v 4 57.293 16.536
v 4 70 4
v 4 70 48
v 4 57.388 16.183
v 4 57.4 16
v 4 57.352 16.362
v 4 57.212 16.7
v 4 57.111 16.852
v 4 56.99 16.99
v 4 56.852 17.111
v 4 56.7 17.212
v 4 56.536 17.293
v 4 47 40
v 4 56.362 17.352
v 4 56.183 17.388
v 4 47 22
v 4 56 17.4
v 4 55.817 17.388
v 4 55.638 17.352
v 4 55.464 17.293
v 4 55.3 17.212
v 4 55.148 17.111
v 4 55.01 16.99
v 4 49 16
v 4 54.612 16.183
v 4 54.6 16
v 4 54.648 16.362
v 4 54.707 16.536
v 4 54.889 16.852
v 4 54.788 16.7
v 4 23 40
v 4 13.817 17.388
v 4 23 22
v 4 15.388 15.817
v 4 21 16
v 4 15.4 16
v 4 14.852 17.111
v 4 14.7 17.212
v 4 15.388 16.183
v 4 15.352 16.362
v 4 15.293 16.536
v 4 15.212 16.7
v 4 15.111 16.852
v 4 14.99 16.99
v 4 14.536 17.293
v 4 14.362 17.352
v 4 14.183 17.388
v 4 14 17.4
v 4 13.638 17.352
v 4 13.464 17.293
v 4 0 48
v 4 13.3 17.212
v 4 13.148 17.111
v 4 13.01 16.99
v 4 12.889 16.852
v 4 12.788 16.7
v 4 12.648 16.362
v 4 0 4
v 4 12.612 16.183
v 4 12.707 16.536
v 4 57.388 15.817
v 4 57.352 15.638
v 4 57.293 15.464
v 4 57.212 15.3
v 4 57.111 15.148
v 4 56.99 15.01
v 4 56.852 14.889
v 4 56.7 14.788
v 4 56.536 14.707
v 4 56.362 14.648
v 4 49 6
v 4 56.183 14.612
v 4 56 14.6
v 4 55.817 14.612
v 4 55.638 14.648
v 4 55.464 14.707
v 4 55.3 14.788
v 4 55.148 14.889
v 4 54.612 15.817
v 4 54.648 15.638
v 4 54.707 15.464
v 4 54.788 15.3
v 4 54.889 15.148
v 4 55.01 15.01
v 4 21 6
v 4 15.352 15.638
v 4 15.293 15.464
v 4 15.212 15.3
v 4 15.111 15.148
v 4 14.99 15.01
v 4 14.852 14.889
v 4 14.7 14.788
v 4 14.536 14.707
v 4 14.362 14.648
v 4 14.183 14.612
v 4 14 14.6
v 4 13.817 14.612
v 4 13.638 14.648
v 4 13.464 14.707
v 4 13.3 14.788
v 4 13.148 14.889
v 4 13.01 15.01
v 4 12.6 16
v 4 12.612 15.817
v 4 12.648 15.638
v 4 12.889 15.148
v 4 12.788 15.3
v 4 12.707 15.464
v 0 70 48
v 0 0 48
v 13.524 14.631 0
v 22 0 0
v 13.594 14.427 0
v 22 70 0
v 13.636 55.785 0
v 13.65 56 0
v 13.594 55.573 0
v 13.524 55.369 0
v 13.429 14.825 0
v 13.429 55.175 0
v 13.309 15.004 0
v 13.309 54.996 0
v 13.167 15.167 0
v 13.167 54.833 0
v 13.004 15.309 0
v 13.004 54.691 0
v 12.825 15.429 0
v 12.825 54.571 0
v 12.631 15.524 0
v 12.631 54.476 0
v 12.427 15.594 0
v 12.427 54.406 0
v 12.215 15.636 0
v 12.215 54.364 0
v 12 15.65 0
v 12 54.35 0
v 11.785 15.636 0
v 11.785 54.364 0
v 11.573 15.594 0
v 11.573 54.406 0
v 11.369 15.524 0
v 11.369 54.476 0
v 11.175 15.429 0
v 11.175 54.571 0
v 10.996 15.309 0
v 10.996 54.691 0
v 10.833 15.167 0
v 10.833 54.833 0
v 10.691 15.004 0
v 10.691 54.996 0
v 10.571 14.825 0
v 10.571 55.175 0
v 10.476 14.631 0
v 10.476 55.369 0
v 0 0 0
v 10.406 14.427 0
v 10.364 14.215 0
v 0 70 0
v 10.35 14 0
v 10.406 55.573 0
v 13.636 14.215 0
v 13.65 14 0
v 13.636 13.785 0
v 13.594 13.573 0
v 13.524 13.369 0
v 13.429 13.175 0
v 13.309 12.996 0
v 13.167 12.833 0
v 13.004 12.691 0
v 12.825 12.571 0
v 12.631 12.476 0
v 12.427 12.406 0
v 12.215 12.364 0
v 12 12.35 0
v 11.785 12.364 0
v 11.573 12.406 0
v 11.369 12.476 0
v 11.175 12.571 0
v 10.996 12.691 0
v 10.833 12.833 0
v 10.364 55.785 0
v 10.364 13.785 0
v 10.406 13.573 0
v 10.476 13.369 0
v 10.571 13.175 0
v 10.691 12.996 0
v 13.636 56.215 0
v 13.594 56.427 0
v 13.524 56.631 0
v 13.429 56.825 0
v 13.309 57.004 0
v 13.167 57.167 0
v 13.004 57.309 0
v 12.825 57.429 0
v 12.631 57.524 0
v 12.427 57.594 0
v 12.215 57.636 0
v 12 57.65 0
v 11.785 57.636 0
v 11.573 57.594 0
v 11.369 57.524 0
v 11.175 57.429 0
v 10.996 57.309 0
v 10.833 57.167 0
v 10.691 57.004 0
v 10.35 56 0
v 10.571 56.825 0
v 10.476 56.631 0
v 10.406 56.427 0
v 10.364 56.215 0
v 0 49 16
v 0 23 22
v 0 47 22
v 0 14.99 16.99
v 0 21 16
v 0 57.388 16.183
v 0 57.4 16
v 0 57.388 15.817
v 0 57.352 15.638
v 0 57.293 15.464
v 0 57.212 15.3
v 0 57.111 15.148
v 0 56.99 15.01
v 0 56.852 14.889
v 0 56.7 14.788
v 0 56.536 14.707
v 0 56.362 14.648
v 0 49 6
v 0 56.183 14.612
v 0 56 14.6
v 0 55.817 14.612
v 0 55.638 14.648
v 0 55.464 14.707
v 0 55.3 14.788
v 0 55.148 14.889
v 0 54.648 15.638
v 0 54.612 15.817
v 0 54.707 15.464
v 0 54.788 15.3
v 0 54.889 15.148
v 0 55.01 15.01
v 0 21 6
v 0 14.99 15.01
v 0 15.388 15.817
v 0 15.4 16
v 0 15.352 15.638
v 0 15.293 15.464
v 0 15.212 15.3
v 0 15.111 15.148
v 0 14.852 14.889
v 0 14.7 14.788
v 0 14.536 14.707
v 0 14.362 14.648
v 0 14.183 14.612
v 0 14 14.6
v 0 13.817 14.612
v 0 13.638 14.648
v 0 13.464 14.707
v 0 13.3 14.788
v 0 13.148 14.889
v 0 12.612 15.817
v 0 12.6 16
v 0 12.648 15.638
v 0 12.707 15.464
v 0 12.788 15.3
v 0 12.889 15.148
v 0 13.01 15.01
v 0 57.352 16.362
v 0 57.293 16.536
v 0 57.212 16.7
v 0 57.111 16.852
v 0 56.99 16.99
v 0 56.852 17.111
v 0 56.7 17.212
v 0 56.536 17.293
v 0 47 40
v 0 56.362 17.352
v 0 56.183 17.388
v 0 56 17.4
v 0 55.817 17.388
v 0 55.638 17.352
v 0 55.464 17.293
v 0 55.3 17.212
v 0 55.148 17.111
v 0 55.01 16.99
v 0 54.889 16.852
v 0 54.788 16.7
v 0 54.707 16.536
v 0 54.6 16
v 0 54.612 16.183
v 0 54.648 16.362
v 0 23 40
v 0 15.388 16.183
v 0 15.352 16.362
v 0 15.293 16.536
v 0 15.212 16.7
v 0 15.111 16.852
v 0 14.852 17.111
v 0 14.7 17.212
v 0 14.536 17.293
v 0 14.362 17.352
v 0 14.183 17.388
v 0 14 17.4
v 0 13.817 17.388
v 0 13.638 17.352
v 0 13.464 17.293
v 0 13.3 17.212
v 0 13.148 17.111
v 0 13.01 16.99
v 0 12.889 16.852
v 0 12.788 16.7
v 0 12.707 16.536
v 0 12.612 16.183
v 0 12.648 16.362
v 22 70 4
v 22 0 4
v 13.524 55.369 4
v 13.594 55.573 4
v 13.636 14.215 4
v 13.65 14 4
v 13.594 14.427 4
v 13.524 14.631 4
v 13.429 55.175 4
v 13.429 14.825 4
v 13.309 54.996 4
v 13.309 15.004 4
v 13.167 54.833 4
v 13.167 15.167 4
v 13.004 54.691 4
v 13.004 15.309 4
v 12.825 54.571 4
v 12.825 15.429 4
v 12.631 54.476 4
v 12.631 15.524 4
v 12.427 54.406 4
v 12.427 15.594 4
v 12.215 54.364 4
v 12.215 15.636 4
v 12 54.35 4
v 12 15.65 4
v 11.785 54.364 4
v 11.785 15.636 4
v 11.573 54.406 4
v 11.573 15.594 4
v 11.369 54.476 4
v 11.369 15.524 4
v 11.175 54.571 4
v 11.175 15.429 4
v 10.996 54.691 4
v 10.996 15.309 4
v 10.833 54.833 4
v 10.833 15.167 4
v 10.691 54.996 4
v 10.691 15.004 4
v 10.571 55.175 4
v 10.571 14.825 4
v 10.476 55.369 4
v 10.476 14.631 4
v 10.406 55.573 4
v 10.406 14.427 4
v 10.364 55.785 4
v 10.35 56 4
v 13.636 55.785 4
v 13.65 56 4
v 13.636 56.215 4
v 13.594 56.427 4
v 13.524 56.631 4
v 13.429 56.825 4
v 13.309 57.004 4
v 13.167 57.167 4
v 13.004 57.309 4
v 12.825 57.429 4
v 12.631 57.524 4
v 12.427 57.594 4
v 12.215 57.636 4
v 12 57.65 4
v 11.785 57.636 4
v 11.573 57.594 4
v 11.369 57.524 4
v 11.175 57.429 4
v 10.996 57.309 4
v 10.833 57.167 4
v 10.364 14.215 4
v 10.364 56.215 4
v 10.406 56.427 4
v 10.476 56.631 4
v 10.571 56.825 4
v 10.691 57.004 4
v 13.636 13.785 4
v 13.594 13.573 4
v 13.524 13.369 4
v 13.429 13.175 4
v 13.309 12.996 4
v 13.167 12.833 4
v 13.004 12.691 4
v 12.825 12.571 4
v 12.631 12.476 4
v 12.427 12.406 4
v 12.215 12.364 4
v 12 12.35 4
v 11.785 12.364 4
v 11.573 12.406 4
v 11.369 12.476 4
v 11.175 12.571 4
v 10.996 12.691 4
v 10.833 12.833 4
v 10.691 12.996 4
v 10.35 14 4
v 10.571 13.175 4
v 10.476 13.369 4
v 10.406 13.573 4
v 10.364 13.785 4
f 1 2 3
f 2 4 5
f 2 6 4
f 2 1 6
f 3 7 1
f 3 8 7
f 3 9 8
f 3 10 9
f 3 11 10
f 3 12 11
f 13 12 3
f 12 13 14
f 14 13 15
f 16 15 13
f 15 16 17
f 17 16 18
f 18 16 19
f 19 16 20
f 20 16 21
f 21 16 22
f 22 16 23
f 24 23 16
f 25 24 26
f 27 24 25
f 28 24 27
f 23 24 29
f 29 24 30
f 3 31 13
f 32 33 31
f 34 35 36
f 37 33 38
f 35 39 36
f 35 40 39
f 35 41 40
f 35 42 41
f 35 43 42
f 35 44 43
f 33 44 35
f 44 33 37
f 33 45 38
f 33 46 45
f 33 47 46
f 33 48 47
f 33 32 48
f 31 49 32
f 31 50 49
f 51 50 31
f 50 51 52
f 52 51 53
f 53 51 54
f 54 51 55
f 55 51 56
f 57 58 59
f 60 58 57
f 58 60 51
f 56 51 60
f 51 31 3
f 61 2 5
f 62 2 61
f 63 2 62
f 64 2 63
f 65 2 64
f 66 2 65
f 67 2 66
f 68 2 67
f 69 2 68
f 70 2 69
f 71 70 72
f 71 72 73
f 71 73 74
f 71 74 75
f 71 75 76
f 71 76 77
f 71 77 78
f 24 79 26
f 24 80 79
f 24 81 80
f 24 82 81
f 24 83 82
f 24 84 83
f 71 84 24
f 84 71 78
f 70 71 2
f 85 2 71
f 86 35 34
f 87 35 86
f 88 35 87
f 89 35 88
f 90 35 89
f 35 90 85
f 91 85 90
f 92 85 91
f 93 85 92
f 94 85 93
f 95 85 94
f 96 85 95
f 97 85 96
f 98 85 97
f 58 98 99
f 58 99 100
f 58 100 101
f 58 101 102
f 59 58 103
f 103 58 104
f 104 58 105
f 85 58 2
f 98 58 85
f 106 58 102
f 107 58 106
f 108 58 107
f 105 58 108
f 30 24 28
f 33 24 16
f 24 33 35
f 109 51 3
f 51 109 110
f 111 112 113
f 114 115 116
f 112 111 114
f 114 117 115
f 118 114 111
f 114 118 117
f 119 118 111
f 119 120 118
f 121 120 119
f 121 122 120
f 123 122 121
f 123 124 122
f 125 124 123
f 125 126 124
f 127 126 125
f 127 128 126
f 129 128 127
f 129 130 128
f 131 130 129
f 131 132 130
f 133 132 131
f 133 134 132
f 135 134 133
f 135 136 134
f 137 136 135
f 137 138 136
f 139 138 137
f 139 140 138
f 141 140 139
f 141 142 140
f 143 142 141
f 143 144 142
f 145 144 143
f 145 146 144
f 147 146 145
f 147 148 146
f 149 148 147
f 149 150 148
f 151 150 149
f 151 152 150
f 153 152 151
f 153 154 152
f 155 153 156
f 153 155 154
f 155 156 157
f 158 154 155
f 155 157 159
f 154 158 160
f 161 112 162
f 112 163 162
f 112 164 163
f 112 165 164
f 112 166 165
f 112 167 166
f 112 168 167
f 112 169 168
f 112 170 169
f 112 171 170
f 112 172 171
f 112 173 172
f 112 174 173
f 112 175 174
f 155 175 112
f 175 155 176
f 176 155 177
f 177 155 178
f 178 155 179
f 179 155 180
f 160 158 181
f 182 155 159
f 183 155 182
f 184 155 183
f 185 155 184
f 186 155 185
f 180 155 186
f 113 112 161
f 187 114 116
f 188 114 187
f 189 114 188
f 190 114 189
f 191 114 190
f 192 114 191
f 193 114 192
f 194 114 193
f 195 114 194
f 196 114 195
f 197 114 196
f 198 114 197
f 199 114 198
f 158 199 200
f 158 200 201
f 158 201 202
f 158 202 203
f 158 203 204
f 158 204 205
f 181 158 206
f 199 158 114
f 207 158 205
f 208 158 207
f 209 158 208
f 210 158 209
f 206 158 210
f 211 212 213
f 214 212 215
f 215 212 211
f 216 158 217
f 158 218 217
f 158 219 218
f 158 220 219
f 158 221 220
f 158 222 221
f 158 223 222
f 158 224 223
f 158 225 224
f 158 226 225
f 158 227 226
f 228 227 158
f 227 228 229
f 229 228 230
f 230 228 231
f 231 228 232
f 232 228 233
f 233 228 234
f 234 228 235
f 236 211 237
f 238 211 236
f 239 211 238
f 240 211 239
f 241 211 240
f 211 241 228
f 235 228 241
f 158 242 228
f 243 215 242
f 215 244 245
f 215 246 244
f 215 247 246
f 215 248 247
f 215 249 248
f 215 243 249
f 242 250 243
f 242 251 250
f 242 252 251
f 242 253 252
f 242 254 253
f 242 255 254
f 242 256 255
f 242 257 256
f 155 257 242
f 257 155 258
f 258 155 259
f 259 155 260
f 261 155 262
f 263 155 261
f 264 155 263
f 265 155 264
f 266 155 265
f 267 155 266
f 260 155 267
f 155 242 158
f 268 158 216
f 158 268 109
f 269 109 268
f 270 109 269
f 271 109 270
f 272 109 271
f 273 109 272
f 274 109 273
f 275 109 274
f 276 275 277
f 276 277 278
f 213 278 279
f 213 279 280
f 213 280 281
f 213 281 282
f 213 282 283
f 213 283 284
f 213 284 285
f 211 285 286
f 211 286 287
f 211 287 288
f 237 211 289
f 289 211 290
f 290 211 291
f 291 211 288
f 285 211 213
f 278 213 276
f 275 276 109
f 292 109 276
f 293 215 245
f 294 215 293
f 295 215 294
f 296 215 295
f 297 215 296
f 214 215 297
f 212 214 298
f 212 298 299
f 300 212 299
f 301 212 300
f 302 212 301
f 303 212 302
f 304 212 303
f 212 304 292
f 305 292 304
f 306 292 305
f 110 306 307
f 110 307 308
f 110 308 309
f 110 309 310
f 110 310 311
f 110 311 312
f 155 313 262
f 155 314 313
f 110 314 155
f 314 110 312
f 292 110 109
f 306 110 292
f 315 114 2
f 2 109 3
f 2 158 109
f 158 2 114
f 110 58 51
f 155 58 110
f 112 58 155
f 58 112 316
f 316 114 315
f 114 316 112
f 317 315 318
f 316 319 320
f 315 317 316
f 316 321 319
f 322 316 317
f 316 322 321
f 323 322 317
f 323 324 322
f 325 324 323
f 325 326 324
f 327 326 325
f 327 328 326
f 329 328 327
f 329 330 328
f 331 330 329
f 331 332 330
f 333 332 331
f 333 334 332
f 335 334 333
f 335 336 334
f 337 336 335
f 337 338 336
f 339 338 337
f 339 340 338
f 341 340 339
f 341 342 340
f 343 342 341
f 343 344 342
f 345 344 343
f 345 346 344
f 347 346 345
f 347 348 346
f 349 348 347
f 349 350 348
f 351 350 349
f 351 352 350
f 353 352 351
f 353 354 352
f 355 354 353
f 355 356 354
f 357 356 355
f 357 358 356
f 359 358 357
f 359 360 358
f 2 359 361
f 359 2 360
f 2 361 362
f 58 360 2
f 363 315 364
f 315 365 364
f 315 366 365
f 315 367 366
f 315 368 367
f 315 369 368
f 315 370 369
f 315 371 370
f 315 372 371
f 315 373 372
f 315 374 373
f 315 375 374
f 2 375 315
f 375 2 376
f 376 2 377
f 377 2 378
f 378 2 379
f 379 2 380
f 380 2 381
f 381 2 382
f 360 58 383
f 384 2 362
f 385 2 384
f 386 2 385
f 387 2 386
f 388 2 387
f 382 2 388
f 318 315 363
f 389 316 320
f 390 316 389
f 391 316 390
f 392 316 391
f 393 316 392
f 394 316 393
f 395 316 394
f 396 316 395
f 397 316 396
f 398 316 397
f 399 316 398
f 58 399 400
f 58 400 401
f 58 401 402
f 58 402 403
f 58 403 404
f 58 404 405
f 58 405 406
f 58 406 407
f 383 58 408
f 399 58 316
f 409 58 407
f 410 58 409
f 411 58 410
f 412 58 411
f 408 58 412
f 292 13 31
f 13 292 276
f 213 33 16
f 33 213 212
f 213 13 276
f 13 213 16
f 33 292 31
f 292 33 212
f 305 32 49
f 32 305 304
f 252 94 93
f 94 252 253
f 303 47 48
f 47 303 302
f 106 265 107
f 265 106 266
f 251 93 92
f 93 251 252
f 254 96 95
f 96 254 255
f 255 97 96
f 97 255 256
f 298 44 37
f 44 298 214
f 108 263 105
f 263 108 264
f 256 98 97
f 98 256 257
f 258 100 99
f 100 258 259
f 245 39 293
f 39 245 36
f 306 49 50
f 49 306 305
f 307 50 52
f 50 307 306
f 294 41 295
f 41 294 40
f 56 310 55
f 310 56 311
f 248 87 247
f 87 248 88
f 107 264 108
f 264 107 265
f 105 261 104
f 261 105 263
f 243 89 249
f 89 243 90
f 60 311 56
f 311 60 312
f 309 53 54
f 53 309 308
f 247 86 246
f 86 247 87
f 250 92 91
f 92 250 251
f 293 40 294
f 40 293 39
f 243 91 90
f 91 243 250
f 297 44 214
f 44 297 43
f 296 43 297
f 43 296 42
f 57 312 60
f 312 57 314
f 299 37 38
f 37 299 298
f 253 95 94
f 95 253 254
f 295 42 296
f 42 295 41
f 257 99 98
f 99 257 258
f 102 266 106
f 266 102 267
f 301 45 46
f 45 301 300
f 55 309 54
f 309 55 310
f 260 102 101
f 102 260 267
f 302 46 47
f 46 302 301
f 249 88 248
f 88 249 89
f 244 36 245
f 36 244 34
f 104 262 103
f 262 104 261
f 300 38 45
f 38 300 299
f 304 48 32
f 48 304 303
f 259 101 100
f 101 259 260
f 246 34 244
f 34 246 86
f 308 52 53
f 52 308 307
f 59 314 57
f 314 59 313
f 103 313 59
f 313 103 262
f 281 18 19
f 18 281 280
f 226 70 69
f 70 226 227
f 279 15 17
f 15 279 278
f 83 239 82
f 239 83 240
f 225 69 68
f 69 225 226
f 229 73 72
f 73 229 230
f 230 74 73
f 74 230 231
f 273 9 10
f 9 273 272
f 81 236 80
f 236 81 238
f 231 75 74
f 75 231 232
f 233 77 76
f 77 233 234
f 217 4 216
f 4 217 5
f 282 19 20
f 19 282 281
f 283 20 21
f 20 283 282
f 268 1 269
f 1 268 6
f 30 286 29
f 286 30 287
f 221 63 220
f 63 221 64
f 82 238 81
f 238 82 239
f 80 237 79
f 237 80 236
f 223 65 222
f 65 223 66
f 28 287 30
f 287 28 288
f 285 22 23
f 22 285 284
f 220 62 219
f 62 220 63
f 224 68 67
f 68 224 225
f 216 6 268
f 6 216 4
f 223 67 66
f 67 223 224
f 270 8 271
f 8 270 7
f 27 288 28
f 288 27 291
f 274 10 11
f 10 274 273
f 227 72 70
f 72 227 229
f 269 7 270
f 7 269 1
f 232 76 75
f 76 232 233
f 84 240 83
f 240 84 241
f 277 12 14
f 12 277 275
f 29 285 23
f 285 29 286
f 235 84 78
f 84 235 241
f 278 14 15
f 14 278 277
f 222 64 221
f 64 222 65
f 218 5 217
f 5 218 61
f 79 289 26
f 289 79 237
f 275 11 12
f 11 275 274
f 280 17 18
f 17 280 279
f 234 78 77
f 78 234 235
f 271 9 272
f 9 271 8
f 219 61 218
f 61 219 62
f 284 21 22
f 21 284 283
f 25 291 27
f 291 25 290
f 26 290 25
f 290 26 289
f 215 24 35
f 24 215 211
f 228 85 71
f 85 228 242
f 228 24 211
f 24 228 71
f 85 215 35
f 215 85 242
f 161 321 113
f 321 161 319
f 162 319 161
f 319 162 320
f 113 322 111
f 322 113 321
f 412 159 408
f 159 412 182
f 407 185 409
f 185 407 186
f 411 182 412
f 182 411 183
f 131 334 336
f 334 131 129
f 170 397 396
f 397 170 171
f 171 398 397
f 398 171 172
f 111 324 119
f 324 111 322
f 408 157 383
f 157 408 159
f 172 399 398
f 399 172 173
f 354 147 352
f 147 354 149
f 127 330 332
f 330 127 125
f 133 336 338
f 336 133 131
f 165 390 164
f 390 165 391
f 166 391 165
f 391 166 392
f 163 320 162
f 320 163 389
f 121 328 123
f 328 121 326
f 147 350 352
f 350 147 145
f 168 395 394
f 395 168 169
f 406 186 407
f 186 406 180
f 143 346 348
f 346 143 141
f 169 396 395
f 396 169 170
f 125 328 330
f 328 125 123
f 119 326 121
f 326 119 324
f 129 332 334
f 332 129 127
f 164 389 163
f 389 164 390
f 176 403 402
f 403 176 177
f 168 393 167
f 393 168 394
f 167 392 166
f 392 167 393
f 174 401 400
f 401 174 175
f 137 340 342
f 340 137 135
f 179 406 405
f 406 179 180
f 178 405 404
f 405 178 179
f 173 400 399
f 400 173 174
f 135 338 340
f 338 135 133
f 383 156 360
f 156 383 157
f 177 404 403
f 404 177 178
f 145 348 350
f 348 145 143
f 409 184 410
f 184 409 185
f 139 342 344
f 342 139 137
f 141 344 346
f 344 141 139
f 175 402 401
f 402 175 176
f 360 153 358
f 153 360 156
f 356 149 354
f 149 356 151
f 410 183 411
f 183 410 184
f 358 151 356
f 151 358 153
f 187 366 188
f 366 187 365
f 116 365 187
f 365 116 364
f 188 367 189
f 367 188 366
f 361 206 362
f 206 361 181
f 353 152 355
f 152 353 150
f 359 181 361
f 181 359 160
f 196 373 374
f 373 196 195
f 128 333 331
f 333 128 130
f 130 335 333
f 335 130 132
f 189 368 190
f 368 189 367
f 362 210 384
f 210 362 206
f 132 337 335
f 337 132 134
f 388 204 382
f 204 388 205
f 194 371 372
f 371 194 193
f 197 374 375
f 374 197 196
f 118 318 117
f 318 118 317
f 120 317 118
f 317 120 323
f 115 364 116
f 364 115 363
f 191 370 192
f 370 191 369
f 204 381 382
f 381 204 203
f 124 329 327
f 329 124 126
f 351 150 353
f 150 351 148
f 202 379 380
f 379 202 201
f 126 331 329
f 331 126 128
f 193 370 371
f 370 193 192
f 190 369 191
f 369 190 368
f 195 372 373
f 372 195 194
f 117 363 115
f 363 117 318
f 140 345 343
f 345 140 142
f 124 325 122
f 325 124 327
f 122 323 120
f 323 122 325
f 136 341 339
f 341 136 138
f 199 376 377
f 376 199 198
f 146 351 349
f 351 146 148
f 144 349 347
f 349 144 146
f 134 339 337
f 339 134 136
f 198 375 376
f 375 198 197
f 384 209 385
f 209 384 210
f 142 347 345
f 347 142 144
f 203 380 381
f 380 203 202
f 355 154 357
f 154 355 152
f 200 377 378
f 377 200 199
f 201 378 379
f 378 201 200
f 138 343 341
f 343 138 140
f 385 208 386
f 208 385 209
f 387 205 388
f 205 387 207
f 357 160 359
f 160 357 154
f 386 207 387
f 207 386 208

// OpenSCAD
// Front camera and sensor mount, units mm
$fn=48; W=70; H=48; T=4; m25=2.8; m3=3.3;
difference(){
 union(){cube([T,W,H]); cube([22,W,T]);}
 translate([-1,W/2-12,22]) cube([T+2,24,18]);
 translate([-1,W/2-21,16]) rotate([0,90,0]) cylinder(h=T+2,d=m25);
 translate([-1,W/2+21,16]) rotate([0,90,0]) cylinder(h=T+2,d=m25);
 translate([-1,W/2-14,6]) cube([T+2,28,10]);
 translate([12,14,-1]) cylinder(h=T+2,d=m3);
 translate([12,W-14,-1]) cylinder(h=T+2,d=m3);
}
